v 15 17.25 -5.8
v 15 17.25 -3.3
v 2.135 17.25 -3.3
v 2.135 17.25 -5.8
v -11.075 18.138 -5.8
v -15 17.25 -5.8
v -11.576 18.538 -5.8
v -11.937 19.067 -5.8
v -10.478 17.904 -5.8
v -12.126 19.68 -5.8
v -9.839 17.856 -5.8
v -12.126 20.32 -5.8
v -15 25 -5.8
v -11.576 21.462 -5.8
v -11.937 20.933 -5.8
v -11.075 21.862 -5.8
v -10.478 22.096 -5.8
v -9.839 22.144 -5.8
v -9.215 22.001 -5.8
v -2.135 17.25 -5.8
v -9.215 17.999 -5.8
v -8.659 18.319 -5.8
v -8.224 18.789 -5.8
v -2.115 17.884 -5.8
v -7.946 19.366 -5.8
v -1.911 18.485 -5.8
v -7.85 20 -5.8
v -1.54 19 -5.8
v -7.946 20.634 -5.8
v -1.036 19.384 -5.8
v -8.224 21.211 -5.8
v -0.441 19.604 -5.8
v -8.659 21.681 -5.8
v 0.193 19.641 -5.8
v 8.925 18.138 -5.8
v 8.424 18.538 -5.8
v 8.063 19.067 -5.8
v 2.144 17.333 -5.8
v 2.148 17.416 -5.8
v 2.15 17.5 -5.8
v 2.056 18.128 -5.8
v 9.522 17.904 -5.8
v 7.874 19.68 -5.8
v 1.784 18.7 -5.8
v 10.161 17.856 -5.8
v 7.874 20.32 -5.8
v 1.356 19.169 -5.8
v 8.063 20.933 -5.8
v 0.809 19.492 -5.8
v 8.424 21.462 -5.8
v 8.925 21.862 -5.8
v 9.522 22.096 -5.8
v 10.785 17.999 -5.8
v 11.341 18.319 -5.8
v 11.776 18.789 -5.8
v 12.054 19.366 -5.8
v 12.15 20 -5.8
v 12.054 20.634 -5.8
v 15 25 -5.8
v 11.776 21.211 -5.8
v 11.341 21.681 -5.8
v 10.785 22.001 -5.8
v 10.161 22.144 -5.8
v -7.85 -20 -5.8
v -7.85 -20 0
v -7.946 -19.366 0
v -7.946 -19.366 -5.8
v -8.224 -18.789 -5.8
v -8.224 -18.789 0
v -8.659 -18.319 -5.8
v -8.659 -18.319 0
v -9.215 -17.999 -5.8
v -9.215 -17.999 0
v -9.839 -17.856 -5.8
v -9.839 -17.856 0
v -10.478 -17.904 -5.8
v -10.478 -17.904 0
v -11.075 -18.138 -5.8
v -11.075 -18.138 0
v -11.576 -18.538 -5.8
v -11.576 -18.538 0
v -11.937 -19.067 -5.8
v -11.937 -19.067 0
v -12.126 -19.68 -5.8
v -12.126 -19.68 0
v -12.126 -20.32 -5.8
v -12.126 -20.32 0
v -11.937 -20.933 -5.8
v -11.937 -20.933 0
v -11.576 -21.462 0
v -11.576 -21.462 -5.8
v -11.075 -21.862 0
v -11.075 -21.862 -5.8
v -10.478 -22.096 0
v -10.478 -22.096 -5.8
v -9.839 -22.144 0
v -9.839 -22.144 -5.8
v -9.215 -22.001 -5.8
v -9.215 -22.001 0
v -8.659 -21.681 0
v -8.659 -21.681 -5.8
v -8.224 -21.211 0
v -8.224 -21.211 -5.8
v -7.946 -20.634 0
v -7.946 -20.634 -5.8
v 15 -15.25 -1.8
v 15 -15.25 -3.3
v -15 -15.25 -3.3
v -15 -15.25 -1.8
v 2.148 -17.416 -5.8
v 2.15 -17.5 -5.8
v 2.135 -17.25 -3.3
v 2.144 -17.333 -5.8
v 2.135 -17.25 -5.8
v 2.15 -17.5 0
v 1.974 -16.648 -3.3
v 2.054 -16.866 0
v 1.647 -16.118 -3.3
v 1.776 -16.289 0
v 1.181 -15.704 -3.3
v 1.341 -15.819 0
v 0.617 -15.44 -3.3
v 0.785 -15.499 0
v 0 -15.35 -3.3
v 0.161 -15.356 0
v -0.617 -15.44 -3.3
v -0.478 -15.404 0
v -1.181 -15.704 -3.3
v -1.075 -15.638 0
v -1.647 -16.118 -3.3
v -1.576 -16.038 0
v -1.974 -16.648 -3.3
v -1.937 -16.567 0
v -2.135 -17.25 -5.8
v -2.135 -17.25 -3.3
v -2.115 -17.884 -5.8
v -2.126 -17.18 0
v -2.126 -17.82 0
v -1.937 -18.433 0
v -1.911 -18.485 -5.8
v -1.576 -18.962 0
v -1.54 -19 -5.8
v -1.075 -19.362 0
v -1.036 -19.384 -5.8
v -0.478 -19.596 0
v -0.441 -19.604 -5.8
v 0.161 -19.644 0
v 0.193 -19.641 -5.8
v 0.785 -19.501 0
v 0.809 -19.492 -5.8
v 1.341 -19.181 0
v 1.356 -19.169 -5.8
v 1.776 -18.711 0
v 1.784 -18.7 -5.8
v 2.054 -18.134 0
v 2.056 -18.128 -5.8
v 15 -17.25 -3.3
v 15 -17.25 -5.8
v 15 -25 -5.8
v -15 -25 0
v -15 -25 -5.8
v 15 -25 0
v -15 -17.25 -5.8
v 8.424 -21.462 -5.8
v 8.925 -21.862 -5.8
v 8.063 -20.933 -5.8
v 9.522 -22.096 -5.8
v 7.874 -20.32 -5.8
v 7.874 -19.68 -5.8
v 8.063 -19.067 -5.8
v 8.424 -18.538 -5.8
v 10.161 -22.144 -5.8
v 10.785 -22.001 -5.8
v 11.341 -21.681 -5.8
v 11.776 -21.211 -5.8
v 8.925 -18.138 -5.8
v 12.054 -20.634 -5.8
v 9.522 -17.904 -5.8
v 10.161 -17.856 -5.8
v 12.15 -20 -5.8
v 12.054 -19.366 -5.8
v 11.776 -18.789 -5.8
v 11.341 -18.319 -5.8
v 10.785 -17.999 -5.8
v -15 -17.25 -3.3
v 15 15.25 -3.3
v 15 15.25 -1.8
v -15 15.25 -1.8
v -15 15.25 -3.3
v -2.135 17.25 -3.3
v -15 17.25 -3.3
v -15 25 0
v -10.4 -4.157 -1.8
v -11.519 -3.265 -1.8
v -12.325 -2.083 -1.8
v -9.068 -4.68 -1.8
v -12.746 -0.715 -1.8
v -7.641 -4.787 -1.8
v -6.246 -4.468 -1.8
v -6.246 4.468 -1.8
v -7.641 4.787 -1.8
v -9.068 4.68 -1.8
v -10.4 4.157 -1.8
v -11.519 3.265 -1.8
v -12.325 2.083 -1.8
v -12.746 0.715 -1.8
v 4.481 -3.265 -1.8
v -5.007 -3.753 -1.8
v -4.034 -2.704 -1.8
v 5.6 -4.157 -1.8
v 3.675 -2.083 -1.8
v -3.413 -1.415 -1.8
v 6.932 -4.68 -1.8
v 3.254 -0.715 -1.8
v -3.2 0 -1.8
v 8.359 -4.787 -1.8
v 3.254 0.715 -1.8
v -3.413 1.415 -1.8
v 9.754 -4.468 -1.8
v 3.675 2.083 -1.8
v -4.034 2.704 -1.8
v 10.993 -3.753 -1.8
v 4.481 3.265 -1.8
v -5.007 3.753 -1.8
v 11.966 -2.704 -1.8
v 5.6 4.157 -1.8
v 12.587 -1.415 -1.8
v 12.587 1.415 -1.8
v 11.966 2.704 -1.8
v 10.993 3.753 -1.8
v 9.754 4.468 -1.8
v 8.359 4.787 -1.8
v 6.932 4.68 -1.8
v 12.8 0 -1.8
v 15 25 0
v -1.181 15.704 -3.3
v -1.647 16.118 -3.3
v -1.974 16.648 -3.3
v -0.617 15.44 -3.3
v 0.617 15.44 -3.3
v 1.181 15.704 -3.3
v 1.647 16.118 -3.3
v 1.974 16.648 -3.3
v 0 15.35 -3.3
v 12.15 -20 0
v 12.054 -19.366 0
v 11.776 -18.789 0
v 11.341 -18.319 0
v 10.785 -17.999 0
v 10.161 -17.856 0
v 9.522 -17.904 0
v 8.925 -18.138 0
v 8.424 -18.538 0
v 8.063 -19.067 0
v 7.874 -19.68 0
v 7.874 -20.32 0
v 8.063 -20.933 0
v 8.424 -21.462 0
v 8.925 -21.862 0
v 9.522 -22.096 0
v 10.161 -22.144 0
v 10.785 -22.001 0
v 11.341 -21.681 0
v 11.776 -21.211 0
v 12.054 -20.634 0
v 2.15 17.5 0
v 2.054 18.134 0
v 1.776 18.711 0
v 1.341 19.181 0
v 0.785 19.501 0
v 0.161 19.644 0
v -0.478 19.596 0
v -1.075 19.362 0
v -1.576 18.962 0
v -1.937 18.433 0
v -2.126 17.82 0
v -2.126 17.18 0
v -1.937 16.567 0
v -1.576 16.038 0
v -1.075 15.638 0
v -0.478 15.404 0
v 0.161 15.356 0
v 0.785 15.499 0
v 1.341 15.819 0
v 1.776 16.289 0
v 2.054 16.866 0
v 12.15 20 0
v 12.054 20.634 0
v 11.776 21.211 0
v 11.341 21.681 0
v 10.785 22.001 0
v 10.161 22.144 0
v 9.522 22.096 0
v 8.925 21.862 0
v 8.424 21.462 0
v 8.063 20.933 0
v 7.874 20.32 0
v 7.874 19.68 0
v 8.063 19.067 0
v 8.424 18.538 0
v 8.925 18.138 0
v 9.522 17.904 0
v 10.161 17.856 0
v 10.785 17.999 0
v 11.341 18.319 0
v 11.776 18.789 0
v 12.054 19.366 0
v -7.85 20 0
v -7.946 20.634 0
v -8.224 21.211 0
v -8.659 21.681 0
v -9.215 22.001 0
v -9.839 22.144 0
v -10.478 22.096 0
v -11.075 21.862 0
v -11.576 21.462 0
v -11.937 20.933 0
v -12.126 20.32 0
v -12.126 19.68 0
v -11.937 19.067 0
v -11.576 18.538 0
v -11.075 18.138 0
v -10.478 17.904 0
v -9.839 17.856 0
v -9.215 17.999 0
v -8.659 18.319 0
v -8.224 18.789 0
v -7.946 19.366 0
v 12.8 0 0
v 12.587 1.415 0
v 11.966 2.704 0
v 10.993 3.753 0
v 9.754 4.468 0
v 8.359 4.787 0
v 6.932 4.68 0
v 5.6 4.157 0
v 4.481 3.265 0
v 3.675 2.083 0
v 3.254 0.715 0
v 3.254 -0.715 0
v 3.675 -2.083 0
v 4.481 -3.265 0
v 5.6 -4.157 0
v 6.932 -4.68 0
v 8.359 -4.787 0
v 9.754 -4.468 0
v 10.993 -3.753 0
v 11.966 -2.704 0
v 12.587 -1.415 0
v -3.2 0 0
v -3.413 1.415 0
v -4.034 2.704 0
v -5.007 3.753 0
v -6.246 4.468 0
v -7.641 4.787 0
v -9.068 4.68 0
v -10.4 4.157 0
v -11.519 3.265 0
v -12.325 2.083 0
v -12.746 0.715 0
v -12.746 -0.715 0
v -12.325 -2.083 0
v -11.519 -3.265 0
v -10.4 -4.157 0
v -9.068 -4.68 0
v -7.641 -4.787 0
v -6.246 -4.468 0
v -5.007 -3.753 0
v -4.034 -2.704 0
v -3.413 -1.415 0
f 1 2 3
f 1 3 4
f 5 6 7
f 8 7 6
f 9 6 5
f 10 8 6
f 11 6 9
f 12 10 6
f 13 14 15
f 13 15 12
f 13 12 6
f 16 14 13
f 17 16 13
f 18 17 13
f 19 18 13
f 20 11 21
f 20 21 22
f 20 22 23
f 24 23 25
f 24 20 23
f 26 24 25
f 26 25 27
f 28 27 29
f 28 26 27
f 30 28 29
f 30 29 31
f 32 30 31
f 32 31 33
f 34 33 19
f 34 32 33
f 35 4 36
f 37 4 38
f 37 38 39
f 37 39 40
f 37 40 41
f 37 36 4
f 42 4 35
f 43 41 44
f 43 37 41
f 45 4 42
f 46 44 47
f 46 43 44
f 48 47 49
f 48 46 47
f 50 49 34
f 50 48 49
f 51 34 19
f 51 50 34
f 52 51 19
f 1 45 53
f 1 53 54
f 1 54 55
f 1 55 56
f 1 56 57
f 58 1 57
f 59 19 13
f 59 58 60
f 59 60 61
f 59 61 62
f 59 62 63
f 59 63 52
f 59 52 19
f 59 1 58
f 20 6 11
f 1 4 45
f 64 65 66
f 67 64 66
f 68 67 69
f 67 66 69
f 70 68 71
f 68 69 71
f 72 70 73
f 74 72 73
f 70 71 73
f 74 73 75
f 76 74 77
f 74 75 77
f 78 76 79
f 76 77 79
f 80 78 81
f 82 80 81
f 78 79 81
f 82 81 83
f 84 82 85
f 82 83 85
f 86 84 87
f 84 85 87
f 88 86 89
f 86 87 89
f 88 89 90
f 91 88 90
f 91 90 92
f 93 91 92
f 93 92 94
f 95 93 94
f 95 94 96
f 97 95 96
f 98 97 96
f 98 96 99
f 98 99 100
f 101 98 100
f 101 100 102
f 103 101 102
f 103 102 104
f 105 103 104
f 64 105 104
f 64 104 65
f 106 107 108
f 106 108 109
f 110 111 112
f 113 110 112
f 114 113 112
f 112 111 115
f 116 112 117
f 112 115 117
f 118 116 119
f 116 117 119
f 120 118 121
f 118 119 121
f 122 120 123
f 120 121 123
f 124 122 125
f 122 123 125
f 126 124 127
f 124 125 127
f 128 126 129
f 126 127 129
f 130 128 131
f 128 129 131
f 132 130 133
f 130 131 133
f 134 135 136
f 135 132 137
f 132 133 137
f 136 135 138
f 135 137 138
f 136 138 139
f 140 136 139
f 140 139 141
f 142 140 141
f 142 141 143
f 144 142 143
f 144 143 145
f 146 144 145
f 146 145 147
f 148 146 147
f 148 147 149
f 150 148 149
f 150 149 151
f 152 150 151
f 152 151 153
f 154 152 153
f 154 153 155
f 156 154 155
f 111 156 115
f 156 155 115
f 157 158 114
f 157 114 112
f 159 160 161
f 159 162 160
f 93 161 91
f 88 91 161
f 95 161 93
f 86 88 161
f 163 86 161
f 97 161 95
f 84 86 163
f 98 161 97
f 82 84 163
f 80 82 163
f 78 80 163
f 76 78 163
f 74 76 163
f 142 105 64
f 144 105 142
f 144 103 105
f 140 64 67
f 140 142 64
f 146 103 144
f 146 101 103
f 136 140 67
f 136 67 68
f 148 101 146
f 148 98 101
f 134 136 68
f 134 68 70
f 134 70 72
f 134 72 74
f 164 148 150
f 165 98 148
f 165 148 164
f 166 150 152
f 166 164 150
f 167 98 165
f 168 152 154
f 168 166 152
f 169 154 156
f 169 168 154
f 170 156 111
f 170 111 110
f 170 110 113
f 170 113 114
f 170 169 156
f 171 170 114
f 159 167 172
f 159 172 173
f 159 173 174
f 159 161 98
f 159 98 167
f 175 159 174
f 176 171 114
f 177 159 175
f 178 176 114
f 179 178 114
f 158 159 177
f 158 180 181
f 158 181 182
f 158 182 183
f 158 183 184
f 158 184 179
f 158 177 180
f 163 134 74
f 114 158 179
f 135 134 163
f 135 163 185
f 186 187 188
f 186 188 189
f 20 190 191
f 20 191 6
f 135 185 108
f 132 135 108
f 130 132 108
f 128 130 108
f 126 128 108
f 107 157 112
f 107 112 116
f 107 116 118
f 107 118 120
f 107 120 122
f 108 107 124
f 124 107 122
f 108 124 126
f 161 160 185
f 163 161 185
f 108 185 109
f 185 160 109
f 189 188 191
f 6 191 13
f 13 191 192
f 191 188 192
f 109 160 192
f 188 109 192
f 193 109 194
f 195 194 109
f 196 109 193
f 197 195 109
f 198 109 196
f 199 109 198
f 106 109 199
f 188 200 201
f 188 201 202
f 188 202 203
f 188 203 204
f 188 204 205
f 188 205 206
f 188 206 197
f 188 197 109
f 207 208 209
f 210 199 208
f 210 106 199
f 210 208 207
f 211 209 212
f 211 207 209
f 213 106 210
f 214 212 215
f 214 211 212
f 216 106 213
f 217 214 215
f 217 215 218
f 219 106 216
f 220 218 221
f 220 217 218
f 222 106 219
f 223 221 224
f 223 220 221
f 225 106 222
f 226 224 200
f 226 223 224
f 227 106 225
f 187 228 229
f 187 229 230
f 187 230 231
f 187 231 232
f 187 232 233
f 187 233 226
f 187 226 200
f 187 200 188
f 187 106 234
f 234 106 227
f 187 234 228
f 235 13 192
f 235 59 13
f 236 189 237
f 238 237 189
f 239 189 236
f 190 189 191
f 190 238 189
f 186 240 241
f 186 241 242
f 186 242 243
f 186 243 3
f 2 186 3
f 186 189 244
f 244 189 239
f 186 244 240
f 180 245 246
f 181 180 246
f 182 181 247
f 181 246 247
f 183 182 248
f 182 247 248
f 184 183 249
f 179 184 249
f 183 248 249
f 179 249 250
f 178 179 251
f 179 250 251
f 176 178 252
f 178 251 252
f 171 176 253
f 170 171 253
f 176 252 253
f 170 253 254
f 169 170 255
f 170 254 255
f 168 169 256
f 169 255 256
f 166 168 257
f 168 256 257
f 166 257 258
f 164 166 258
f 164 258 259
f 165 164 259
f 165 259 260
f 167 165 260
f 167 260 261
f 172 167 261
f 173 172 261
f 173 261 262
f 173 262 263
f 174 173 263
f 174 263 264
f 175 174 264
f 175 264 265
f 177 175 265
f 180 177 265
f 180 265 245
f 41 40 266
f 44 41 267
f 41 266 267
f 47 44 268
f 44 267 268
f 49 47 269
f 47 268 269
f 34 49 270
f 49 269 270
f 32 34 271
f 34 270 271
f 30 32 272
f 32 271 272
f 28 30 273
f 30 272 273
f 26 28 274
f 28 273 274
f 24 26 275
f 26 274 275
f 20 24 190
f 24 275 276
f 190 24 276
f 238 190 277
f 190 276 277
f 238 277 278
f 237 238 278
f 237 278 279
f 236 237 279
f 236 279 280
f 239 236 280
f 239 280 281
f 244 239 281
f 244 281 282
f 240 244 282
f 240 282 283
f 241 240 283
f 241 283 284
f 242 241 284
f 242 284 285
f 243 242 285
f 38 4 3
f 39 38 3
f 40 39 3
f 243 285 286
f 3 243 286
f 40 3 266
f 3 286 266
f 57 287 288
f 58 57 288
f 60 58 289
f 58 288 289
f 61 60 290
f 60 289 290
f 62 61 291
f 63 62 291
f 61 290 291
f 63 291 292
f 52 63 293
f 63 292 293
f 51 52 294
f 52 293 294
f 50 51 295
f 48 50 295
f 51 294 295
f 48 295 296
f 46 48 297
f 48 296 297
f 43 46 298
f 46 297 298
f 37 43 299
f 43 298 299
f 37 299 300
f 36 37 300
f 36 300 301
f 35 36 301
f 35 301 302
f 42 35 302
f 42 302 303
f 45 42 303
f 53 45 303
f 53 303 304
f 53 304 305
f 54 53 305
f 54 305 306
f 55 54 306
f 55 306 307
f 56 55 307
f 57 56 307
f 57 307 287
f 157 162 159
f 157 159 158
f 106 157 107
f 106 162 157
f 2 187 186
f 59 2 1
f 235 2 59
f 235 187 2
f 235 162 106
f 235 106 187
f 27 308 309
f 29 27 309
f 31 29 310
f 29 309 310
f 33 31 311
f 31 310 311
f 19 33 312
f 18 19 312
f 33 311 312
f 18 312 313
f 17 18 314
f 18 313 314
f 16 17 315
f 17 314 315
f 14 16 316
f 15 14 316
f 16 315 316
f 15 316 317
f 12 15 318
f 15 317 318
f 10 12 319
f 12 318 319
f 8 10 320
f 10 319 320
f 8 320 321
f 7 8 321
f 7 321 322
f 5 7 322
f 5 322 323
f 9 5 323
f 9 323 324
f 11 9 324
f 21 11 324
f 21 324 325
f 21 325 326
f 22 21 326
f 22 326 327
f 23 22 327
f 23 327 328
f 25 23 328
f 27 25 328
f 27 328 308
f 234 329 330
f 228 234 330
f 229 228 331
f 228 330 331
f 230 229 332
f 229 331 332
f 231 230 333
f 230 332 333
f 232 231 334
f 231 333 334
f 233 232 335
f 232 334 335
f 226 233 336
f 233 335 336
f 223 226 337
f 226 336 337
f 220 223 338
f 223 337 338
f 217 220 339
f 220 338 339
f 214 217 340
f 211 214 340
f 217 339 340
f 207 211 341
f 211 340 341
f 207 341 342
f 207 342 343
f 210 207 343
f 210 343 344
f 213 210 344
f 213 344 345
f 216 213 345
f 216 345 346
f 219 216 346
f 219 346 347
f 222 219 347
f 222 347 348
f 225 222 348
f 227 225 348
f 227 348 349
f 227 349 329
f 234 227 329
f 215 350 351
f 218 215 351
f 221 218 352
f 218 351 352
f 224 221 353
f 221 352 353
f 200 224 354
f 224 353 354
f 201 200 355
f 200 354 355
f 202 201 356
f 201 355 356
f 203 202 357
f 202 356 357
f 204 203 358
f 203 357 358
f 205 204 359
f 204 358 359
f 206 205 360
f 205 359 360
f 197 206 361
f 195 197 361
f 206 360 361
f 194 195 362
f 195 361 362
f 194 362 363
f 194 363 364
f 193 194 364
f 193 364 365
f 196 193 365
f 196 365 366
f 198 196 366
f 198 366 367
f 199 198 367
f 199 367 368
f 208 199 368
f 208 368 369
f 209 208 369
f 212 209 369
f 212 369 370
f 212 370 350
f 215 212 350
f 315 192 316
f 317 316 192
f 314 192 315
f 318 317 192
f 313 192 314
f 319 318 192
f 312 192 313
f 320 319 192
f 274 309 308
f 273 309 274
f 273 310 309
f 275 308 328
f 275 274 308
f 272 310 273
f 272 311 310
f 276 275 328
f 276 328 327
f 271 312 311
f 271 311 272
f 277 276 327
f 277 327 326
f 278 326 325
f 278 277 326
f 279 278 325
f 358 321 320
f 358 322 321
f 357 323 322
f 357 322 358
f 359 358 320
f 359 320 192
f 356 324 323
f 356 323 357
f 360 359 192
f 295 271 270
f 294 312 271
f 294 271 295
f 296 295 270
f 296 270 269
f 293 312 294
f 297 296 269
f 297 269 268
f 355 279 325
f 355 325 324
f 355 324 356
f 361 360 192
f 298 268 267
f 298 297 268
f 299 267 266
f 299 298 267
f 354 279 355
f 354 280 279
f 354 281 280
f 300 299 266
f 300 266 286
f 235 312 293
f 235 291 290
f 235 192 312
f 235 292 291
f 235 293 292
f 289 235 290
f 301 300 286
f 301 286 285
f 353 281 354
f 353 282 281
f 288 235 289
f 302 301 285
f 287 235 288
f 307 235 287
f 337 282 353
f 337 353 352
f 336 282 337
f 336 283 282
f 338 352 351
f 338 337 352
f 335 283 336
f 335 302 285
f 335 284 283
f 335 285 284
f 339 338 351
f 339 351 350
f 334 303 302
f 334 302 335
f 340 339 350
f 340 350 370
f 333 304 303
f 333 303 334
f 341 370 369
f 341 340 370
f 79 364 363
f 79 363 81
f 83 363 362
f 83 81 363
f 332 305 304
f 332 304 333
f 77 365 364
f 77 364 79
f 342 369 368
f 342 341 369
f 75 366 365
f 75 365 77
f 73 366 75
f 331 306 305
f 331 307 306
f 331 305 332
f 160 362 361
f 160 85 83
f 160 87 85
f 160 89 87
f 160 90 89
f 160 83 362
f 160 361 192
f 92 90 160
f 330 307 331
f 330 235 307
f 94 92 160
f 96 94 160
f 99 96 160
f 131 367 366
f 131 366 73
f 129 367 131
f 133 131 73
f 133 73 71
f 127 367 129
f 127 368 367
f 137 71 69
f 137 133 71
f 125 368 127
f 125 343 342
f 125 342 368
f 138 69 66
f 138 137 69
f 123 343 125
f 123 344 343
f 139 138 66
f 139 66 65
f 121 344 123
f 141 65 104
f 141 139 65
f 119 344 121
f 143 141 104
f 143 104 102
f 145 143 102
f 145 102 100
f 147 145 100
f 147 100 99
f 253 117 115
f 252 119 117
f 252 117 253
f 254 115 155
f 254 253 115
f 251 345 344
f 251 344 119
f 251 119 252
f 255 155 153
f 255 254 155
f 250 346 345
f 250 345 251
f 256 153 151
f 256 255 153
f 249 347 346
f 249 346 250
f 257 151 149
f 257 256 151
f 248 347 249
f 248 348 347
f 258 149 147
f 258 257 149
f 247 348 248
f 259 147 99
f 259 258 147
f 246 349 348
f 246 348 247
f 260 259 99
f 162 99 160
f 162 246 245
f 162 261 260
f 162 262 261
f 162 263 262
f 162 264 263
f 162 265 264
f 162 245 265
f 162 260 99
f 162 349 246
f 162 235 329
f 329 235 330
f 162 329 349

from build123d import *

# Parameters (mm, degrees)
PAD_DEPTH       = 15
PAD_DEPTH_BACK  = 15
SKETCH001_R     = 2.15
HOLE_DEPTH      = 25
SKETCH003_R     = 4.8
POCKET001_DEPTH = 5


with BuildPart() as part:
    # Sketch → Pad (new body, two sides)
    with BuildSketch(Plane.YZ) as pad_sk:
        Polygon((-25, 0), (-25, -5.8), (-17.25, -5.8), (-17.25, -3.3), (-15.25, -3.3), (-15.25, -1.8), (15.25, -1.8), (15.25, -3.3), (17.25, -3.3), (17.25, -5.8), (25, -5.8), (25, 0), align=None)
    extrude(amount=PAD_DEPTH)
    extrude(pad_sk.sketch, amount=-PAD_DEPTH_BACK)

    # Sketch001 → Hole (cut)
    with BuildSketch(Plane.XY):
        with Locations((-10, 20)):
            Circle(SKETCH001_R)
        with Locations((0, 17.5)):
            Circle(SKETCH001_R)
        with Locations((10, 20)):
            Circle(SKETCH001_R)
        with Locations((10, -20)):
            Circle(SKETCH001_R)
        with Locations((0, -17.5)):
            Circle(SKETCH001_R)
        with Locations((-10, -20)):
            Circle(SKETCH001_R)
    extrude(amount=-HOLE_DEPTH, mode=Mode.SUBTRACT)

    # Sketch003 → Pocket001 (cut)
    with BuildSketch(Plane.XY):
        with Locations((-8, 0)):
            Circle(SKETCH003_R)
        with Locations((8, 0)):
            Circle(SKETCH003_R)
    extrude(amount=-POCKET001_DEPTH, mode=Mode.SUBTRACT)


solid = part.part
